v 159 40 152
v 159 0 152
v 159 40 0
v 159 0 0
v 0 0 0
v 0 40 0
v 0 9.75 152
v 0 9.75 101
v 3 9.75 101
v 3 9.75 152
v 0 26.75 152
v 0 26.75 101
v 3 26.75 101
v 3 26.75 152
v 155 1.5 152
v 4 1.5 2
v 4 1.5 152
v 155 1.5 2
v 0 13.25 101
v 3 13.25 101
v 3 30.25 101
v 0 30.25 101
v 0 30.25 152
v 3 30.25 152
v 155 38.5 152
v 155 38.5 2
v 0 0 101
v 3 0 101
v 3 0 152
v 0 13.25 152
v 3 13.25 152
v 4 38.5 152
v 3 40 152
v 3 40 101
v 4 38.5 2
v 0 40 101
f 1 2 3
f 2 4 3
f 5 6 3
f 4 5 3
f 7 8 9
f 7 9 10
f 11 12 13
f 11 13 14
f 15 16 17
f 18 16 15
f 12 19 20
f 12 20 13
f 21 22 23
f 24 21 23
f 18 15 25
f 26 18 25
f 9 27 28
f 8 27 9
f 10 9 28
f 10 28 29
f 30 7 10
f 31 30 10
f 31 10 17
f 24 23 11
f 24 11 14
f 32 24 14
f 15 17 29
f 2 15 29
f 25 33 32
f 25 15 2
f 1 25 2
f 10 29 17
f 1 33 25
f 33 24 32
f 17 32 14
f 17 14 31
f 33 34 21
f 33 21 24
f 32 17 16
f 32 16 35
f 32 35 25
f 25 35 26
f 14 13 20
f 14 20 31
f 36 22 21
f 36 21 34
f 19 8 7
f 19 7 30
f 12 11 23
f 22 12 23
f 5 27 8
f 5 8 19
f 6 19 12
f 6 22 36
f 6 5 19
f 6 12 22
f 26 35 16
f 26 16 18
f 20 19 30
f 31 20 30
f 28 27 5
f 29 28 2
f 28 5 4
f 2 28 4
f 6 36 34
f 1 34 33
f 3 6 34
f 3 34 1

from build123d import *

# Parameters (mm, degrees)
ESQUISSE1_W             = 159
ESQUISSE1_H             = 40
BOSS_EXTRU_1_DEPTH      = 2
ESQUISSE2_W             = 159
ESQUISSE2_H             = 40
ESQUISSE2_W_2           = 151
ESQUISSE2_H_2           = 37
BOSS_EXTRU_2_DEPTH      = 150
ESQUISSE3_W             = 51
ESQUISSE3_H             = 9.75
ESQUISSE3_H_2           = 13.5
ENL_V_MAT_EXTRU_1_DEPTH = 3


with BuildPart() as part:
    # Esquisse1 → Boss.-Extru.1 (new body)
    with BuildSketch(Plane.XY):
        with Locations((79.5, 20)):
            Rectangle(ESQUISSE1_W, ESQUISSE1_H)
    extrude(amount=BOSS_EXTRU_1_DEPTH)

    # Esquisse2 → Boss.-Extru.2 (add)
    with BuildSketch(Plane.XY.offset(2)):
        with Locations((79.5, 20)):
            Rectangle(ESQUISSE2_W, ESQUISSE2_H)
        with Locations((79.5, 20)):
            Rectangle(ESQUISSE2_W_2, ESQUISSE2_H_2, mode=Mode.SUBTRACT)
    extrude(amount=BOSS_EXTRU_2_DEPTH)

    # Esquisse3 → Enlèv. mat.-Extru.1 (cut)
    with BuildSketch(Plane.ZY):
        with Locations((126.5, 35.125)):
            Rectangle(ESQUISSE3_W, ESQUISSE3_H)
        with Locations((126.5, 20)):
            Rectangle(ESQUISSE3_W, ESQUISSE3_H_2)
        with Locations((126.5, 4.875)):
            Rectangle(ESQUISSE3_W, ESQUISSE3_H)
    extrude(amount=-ENL_V_MAT_EXTRU_1_DEPTH, mode=Mode.SUBTRACT)


solid = part.part
